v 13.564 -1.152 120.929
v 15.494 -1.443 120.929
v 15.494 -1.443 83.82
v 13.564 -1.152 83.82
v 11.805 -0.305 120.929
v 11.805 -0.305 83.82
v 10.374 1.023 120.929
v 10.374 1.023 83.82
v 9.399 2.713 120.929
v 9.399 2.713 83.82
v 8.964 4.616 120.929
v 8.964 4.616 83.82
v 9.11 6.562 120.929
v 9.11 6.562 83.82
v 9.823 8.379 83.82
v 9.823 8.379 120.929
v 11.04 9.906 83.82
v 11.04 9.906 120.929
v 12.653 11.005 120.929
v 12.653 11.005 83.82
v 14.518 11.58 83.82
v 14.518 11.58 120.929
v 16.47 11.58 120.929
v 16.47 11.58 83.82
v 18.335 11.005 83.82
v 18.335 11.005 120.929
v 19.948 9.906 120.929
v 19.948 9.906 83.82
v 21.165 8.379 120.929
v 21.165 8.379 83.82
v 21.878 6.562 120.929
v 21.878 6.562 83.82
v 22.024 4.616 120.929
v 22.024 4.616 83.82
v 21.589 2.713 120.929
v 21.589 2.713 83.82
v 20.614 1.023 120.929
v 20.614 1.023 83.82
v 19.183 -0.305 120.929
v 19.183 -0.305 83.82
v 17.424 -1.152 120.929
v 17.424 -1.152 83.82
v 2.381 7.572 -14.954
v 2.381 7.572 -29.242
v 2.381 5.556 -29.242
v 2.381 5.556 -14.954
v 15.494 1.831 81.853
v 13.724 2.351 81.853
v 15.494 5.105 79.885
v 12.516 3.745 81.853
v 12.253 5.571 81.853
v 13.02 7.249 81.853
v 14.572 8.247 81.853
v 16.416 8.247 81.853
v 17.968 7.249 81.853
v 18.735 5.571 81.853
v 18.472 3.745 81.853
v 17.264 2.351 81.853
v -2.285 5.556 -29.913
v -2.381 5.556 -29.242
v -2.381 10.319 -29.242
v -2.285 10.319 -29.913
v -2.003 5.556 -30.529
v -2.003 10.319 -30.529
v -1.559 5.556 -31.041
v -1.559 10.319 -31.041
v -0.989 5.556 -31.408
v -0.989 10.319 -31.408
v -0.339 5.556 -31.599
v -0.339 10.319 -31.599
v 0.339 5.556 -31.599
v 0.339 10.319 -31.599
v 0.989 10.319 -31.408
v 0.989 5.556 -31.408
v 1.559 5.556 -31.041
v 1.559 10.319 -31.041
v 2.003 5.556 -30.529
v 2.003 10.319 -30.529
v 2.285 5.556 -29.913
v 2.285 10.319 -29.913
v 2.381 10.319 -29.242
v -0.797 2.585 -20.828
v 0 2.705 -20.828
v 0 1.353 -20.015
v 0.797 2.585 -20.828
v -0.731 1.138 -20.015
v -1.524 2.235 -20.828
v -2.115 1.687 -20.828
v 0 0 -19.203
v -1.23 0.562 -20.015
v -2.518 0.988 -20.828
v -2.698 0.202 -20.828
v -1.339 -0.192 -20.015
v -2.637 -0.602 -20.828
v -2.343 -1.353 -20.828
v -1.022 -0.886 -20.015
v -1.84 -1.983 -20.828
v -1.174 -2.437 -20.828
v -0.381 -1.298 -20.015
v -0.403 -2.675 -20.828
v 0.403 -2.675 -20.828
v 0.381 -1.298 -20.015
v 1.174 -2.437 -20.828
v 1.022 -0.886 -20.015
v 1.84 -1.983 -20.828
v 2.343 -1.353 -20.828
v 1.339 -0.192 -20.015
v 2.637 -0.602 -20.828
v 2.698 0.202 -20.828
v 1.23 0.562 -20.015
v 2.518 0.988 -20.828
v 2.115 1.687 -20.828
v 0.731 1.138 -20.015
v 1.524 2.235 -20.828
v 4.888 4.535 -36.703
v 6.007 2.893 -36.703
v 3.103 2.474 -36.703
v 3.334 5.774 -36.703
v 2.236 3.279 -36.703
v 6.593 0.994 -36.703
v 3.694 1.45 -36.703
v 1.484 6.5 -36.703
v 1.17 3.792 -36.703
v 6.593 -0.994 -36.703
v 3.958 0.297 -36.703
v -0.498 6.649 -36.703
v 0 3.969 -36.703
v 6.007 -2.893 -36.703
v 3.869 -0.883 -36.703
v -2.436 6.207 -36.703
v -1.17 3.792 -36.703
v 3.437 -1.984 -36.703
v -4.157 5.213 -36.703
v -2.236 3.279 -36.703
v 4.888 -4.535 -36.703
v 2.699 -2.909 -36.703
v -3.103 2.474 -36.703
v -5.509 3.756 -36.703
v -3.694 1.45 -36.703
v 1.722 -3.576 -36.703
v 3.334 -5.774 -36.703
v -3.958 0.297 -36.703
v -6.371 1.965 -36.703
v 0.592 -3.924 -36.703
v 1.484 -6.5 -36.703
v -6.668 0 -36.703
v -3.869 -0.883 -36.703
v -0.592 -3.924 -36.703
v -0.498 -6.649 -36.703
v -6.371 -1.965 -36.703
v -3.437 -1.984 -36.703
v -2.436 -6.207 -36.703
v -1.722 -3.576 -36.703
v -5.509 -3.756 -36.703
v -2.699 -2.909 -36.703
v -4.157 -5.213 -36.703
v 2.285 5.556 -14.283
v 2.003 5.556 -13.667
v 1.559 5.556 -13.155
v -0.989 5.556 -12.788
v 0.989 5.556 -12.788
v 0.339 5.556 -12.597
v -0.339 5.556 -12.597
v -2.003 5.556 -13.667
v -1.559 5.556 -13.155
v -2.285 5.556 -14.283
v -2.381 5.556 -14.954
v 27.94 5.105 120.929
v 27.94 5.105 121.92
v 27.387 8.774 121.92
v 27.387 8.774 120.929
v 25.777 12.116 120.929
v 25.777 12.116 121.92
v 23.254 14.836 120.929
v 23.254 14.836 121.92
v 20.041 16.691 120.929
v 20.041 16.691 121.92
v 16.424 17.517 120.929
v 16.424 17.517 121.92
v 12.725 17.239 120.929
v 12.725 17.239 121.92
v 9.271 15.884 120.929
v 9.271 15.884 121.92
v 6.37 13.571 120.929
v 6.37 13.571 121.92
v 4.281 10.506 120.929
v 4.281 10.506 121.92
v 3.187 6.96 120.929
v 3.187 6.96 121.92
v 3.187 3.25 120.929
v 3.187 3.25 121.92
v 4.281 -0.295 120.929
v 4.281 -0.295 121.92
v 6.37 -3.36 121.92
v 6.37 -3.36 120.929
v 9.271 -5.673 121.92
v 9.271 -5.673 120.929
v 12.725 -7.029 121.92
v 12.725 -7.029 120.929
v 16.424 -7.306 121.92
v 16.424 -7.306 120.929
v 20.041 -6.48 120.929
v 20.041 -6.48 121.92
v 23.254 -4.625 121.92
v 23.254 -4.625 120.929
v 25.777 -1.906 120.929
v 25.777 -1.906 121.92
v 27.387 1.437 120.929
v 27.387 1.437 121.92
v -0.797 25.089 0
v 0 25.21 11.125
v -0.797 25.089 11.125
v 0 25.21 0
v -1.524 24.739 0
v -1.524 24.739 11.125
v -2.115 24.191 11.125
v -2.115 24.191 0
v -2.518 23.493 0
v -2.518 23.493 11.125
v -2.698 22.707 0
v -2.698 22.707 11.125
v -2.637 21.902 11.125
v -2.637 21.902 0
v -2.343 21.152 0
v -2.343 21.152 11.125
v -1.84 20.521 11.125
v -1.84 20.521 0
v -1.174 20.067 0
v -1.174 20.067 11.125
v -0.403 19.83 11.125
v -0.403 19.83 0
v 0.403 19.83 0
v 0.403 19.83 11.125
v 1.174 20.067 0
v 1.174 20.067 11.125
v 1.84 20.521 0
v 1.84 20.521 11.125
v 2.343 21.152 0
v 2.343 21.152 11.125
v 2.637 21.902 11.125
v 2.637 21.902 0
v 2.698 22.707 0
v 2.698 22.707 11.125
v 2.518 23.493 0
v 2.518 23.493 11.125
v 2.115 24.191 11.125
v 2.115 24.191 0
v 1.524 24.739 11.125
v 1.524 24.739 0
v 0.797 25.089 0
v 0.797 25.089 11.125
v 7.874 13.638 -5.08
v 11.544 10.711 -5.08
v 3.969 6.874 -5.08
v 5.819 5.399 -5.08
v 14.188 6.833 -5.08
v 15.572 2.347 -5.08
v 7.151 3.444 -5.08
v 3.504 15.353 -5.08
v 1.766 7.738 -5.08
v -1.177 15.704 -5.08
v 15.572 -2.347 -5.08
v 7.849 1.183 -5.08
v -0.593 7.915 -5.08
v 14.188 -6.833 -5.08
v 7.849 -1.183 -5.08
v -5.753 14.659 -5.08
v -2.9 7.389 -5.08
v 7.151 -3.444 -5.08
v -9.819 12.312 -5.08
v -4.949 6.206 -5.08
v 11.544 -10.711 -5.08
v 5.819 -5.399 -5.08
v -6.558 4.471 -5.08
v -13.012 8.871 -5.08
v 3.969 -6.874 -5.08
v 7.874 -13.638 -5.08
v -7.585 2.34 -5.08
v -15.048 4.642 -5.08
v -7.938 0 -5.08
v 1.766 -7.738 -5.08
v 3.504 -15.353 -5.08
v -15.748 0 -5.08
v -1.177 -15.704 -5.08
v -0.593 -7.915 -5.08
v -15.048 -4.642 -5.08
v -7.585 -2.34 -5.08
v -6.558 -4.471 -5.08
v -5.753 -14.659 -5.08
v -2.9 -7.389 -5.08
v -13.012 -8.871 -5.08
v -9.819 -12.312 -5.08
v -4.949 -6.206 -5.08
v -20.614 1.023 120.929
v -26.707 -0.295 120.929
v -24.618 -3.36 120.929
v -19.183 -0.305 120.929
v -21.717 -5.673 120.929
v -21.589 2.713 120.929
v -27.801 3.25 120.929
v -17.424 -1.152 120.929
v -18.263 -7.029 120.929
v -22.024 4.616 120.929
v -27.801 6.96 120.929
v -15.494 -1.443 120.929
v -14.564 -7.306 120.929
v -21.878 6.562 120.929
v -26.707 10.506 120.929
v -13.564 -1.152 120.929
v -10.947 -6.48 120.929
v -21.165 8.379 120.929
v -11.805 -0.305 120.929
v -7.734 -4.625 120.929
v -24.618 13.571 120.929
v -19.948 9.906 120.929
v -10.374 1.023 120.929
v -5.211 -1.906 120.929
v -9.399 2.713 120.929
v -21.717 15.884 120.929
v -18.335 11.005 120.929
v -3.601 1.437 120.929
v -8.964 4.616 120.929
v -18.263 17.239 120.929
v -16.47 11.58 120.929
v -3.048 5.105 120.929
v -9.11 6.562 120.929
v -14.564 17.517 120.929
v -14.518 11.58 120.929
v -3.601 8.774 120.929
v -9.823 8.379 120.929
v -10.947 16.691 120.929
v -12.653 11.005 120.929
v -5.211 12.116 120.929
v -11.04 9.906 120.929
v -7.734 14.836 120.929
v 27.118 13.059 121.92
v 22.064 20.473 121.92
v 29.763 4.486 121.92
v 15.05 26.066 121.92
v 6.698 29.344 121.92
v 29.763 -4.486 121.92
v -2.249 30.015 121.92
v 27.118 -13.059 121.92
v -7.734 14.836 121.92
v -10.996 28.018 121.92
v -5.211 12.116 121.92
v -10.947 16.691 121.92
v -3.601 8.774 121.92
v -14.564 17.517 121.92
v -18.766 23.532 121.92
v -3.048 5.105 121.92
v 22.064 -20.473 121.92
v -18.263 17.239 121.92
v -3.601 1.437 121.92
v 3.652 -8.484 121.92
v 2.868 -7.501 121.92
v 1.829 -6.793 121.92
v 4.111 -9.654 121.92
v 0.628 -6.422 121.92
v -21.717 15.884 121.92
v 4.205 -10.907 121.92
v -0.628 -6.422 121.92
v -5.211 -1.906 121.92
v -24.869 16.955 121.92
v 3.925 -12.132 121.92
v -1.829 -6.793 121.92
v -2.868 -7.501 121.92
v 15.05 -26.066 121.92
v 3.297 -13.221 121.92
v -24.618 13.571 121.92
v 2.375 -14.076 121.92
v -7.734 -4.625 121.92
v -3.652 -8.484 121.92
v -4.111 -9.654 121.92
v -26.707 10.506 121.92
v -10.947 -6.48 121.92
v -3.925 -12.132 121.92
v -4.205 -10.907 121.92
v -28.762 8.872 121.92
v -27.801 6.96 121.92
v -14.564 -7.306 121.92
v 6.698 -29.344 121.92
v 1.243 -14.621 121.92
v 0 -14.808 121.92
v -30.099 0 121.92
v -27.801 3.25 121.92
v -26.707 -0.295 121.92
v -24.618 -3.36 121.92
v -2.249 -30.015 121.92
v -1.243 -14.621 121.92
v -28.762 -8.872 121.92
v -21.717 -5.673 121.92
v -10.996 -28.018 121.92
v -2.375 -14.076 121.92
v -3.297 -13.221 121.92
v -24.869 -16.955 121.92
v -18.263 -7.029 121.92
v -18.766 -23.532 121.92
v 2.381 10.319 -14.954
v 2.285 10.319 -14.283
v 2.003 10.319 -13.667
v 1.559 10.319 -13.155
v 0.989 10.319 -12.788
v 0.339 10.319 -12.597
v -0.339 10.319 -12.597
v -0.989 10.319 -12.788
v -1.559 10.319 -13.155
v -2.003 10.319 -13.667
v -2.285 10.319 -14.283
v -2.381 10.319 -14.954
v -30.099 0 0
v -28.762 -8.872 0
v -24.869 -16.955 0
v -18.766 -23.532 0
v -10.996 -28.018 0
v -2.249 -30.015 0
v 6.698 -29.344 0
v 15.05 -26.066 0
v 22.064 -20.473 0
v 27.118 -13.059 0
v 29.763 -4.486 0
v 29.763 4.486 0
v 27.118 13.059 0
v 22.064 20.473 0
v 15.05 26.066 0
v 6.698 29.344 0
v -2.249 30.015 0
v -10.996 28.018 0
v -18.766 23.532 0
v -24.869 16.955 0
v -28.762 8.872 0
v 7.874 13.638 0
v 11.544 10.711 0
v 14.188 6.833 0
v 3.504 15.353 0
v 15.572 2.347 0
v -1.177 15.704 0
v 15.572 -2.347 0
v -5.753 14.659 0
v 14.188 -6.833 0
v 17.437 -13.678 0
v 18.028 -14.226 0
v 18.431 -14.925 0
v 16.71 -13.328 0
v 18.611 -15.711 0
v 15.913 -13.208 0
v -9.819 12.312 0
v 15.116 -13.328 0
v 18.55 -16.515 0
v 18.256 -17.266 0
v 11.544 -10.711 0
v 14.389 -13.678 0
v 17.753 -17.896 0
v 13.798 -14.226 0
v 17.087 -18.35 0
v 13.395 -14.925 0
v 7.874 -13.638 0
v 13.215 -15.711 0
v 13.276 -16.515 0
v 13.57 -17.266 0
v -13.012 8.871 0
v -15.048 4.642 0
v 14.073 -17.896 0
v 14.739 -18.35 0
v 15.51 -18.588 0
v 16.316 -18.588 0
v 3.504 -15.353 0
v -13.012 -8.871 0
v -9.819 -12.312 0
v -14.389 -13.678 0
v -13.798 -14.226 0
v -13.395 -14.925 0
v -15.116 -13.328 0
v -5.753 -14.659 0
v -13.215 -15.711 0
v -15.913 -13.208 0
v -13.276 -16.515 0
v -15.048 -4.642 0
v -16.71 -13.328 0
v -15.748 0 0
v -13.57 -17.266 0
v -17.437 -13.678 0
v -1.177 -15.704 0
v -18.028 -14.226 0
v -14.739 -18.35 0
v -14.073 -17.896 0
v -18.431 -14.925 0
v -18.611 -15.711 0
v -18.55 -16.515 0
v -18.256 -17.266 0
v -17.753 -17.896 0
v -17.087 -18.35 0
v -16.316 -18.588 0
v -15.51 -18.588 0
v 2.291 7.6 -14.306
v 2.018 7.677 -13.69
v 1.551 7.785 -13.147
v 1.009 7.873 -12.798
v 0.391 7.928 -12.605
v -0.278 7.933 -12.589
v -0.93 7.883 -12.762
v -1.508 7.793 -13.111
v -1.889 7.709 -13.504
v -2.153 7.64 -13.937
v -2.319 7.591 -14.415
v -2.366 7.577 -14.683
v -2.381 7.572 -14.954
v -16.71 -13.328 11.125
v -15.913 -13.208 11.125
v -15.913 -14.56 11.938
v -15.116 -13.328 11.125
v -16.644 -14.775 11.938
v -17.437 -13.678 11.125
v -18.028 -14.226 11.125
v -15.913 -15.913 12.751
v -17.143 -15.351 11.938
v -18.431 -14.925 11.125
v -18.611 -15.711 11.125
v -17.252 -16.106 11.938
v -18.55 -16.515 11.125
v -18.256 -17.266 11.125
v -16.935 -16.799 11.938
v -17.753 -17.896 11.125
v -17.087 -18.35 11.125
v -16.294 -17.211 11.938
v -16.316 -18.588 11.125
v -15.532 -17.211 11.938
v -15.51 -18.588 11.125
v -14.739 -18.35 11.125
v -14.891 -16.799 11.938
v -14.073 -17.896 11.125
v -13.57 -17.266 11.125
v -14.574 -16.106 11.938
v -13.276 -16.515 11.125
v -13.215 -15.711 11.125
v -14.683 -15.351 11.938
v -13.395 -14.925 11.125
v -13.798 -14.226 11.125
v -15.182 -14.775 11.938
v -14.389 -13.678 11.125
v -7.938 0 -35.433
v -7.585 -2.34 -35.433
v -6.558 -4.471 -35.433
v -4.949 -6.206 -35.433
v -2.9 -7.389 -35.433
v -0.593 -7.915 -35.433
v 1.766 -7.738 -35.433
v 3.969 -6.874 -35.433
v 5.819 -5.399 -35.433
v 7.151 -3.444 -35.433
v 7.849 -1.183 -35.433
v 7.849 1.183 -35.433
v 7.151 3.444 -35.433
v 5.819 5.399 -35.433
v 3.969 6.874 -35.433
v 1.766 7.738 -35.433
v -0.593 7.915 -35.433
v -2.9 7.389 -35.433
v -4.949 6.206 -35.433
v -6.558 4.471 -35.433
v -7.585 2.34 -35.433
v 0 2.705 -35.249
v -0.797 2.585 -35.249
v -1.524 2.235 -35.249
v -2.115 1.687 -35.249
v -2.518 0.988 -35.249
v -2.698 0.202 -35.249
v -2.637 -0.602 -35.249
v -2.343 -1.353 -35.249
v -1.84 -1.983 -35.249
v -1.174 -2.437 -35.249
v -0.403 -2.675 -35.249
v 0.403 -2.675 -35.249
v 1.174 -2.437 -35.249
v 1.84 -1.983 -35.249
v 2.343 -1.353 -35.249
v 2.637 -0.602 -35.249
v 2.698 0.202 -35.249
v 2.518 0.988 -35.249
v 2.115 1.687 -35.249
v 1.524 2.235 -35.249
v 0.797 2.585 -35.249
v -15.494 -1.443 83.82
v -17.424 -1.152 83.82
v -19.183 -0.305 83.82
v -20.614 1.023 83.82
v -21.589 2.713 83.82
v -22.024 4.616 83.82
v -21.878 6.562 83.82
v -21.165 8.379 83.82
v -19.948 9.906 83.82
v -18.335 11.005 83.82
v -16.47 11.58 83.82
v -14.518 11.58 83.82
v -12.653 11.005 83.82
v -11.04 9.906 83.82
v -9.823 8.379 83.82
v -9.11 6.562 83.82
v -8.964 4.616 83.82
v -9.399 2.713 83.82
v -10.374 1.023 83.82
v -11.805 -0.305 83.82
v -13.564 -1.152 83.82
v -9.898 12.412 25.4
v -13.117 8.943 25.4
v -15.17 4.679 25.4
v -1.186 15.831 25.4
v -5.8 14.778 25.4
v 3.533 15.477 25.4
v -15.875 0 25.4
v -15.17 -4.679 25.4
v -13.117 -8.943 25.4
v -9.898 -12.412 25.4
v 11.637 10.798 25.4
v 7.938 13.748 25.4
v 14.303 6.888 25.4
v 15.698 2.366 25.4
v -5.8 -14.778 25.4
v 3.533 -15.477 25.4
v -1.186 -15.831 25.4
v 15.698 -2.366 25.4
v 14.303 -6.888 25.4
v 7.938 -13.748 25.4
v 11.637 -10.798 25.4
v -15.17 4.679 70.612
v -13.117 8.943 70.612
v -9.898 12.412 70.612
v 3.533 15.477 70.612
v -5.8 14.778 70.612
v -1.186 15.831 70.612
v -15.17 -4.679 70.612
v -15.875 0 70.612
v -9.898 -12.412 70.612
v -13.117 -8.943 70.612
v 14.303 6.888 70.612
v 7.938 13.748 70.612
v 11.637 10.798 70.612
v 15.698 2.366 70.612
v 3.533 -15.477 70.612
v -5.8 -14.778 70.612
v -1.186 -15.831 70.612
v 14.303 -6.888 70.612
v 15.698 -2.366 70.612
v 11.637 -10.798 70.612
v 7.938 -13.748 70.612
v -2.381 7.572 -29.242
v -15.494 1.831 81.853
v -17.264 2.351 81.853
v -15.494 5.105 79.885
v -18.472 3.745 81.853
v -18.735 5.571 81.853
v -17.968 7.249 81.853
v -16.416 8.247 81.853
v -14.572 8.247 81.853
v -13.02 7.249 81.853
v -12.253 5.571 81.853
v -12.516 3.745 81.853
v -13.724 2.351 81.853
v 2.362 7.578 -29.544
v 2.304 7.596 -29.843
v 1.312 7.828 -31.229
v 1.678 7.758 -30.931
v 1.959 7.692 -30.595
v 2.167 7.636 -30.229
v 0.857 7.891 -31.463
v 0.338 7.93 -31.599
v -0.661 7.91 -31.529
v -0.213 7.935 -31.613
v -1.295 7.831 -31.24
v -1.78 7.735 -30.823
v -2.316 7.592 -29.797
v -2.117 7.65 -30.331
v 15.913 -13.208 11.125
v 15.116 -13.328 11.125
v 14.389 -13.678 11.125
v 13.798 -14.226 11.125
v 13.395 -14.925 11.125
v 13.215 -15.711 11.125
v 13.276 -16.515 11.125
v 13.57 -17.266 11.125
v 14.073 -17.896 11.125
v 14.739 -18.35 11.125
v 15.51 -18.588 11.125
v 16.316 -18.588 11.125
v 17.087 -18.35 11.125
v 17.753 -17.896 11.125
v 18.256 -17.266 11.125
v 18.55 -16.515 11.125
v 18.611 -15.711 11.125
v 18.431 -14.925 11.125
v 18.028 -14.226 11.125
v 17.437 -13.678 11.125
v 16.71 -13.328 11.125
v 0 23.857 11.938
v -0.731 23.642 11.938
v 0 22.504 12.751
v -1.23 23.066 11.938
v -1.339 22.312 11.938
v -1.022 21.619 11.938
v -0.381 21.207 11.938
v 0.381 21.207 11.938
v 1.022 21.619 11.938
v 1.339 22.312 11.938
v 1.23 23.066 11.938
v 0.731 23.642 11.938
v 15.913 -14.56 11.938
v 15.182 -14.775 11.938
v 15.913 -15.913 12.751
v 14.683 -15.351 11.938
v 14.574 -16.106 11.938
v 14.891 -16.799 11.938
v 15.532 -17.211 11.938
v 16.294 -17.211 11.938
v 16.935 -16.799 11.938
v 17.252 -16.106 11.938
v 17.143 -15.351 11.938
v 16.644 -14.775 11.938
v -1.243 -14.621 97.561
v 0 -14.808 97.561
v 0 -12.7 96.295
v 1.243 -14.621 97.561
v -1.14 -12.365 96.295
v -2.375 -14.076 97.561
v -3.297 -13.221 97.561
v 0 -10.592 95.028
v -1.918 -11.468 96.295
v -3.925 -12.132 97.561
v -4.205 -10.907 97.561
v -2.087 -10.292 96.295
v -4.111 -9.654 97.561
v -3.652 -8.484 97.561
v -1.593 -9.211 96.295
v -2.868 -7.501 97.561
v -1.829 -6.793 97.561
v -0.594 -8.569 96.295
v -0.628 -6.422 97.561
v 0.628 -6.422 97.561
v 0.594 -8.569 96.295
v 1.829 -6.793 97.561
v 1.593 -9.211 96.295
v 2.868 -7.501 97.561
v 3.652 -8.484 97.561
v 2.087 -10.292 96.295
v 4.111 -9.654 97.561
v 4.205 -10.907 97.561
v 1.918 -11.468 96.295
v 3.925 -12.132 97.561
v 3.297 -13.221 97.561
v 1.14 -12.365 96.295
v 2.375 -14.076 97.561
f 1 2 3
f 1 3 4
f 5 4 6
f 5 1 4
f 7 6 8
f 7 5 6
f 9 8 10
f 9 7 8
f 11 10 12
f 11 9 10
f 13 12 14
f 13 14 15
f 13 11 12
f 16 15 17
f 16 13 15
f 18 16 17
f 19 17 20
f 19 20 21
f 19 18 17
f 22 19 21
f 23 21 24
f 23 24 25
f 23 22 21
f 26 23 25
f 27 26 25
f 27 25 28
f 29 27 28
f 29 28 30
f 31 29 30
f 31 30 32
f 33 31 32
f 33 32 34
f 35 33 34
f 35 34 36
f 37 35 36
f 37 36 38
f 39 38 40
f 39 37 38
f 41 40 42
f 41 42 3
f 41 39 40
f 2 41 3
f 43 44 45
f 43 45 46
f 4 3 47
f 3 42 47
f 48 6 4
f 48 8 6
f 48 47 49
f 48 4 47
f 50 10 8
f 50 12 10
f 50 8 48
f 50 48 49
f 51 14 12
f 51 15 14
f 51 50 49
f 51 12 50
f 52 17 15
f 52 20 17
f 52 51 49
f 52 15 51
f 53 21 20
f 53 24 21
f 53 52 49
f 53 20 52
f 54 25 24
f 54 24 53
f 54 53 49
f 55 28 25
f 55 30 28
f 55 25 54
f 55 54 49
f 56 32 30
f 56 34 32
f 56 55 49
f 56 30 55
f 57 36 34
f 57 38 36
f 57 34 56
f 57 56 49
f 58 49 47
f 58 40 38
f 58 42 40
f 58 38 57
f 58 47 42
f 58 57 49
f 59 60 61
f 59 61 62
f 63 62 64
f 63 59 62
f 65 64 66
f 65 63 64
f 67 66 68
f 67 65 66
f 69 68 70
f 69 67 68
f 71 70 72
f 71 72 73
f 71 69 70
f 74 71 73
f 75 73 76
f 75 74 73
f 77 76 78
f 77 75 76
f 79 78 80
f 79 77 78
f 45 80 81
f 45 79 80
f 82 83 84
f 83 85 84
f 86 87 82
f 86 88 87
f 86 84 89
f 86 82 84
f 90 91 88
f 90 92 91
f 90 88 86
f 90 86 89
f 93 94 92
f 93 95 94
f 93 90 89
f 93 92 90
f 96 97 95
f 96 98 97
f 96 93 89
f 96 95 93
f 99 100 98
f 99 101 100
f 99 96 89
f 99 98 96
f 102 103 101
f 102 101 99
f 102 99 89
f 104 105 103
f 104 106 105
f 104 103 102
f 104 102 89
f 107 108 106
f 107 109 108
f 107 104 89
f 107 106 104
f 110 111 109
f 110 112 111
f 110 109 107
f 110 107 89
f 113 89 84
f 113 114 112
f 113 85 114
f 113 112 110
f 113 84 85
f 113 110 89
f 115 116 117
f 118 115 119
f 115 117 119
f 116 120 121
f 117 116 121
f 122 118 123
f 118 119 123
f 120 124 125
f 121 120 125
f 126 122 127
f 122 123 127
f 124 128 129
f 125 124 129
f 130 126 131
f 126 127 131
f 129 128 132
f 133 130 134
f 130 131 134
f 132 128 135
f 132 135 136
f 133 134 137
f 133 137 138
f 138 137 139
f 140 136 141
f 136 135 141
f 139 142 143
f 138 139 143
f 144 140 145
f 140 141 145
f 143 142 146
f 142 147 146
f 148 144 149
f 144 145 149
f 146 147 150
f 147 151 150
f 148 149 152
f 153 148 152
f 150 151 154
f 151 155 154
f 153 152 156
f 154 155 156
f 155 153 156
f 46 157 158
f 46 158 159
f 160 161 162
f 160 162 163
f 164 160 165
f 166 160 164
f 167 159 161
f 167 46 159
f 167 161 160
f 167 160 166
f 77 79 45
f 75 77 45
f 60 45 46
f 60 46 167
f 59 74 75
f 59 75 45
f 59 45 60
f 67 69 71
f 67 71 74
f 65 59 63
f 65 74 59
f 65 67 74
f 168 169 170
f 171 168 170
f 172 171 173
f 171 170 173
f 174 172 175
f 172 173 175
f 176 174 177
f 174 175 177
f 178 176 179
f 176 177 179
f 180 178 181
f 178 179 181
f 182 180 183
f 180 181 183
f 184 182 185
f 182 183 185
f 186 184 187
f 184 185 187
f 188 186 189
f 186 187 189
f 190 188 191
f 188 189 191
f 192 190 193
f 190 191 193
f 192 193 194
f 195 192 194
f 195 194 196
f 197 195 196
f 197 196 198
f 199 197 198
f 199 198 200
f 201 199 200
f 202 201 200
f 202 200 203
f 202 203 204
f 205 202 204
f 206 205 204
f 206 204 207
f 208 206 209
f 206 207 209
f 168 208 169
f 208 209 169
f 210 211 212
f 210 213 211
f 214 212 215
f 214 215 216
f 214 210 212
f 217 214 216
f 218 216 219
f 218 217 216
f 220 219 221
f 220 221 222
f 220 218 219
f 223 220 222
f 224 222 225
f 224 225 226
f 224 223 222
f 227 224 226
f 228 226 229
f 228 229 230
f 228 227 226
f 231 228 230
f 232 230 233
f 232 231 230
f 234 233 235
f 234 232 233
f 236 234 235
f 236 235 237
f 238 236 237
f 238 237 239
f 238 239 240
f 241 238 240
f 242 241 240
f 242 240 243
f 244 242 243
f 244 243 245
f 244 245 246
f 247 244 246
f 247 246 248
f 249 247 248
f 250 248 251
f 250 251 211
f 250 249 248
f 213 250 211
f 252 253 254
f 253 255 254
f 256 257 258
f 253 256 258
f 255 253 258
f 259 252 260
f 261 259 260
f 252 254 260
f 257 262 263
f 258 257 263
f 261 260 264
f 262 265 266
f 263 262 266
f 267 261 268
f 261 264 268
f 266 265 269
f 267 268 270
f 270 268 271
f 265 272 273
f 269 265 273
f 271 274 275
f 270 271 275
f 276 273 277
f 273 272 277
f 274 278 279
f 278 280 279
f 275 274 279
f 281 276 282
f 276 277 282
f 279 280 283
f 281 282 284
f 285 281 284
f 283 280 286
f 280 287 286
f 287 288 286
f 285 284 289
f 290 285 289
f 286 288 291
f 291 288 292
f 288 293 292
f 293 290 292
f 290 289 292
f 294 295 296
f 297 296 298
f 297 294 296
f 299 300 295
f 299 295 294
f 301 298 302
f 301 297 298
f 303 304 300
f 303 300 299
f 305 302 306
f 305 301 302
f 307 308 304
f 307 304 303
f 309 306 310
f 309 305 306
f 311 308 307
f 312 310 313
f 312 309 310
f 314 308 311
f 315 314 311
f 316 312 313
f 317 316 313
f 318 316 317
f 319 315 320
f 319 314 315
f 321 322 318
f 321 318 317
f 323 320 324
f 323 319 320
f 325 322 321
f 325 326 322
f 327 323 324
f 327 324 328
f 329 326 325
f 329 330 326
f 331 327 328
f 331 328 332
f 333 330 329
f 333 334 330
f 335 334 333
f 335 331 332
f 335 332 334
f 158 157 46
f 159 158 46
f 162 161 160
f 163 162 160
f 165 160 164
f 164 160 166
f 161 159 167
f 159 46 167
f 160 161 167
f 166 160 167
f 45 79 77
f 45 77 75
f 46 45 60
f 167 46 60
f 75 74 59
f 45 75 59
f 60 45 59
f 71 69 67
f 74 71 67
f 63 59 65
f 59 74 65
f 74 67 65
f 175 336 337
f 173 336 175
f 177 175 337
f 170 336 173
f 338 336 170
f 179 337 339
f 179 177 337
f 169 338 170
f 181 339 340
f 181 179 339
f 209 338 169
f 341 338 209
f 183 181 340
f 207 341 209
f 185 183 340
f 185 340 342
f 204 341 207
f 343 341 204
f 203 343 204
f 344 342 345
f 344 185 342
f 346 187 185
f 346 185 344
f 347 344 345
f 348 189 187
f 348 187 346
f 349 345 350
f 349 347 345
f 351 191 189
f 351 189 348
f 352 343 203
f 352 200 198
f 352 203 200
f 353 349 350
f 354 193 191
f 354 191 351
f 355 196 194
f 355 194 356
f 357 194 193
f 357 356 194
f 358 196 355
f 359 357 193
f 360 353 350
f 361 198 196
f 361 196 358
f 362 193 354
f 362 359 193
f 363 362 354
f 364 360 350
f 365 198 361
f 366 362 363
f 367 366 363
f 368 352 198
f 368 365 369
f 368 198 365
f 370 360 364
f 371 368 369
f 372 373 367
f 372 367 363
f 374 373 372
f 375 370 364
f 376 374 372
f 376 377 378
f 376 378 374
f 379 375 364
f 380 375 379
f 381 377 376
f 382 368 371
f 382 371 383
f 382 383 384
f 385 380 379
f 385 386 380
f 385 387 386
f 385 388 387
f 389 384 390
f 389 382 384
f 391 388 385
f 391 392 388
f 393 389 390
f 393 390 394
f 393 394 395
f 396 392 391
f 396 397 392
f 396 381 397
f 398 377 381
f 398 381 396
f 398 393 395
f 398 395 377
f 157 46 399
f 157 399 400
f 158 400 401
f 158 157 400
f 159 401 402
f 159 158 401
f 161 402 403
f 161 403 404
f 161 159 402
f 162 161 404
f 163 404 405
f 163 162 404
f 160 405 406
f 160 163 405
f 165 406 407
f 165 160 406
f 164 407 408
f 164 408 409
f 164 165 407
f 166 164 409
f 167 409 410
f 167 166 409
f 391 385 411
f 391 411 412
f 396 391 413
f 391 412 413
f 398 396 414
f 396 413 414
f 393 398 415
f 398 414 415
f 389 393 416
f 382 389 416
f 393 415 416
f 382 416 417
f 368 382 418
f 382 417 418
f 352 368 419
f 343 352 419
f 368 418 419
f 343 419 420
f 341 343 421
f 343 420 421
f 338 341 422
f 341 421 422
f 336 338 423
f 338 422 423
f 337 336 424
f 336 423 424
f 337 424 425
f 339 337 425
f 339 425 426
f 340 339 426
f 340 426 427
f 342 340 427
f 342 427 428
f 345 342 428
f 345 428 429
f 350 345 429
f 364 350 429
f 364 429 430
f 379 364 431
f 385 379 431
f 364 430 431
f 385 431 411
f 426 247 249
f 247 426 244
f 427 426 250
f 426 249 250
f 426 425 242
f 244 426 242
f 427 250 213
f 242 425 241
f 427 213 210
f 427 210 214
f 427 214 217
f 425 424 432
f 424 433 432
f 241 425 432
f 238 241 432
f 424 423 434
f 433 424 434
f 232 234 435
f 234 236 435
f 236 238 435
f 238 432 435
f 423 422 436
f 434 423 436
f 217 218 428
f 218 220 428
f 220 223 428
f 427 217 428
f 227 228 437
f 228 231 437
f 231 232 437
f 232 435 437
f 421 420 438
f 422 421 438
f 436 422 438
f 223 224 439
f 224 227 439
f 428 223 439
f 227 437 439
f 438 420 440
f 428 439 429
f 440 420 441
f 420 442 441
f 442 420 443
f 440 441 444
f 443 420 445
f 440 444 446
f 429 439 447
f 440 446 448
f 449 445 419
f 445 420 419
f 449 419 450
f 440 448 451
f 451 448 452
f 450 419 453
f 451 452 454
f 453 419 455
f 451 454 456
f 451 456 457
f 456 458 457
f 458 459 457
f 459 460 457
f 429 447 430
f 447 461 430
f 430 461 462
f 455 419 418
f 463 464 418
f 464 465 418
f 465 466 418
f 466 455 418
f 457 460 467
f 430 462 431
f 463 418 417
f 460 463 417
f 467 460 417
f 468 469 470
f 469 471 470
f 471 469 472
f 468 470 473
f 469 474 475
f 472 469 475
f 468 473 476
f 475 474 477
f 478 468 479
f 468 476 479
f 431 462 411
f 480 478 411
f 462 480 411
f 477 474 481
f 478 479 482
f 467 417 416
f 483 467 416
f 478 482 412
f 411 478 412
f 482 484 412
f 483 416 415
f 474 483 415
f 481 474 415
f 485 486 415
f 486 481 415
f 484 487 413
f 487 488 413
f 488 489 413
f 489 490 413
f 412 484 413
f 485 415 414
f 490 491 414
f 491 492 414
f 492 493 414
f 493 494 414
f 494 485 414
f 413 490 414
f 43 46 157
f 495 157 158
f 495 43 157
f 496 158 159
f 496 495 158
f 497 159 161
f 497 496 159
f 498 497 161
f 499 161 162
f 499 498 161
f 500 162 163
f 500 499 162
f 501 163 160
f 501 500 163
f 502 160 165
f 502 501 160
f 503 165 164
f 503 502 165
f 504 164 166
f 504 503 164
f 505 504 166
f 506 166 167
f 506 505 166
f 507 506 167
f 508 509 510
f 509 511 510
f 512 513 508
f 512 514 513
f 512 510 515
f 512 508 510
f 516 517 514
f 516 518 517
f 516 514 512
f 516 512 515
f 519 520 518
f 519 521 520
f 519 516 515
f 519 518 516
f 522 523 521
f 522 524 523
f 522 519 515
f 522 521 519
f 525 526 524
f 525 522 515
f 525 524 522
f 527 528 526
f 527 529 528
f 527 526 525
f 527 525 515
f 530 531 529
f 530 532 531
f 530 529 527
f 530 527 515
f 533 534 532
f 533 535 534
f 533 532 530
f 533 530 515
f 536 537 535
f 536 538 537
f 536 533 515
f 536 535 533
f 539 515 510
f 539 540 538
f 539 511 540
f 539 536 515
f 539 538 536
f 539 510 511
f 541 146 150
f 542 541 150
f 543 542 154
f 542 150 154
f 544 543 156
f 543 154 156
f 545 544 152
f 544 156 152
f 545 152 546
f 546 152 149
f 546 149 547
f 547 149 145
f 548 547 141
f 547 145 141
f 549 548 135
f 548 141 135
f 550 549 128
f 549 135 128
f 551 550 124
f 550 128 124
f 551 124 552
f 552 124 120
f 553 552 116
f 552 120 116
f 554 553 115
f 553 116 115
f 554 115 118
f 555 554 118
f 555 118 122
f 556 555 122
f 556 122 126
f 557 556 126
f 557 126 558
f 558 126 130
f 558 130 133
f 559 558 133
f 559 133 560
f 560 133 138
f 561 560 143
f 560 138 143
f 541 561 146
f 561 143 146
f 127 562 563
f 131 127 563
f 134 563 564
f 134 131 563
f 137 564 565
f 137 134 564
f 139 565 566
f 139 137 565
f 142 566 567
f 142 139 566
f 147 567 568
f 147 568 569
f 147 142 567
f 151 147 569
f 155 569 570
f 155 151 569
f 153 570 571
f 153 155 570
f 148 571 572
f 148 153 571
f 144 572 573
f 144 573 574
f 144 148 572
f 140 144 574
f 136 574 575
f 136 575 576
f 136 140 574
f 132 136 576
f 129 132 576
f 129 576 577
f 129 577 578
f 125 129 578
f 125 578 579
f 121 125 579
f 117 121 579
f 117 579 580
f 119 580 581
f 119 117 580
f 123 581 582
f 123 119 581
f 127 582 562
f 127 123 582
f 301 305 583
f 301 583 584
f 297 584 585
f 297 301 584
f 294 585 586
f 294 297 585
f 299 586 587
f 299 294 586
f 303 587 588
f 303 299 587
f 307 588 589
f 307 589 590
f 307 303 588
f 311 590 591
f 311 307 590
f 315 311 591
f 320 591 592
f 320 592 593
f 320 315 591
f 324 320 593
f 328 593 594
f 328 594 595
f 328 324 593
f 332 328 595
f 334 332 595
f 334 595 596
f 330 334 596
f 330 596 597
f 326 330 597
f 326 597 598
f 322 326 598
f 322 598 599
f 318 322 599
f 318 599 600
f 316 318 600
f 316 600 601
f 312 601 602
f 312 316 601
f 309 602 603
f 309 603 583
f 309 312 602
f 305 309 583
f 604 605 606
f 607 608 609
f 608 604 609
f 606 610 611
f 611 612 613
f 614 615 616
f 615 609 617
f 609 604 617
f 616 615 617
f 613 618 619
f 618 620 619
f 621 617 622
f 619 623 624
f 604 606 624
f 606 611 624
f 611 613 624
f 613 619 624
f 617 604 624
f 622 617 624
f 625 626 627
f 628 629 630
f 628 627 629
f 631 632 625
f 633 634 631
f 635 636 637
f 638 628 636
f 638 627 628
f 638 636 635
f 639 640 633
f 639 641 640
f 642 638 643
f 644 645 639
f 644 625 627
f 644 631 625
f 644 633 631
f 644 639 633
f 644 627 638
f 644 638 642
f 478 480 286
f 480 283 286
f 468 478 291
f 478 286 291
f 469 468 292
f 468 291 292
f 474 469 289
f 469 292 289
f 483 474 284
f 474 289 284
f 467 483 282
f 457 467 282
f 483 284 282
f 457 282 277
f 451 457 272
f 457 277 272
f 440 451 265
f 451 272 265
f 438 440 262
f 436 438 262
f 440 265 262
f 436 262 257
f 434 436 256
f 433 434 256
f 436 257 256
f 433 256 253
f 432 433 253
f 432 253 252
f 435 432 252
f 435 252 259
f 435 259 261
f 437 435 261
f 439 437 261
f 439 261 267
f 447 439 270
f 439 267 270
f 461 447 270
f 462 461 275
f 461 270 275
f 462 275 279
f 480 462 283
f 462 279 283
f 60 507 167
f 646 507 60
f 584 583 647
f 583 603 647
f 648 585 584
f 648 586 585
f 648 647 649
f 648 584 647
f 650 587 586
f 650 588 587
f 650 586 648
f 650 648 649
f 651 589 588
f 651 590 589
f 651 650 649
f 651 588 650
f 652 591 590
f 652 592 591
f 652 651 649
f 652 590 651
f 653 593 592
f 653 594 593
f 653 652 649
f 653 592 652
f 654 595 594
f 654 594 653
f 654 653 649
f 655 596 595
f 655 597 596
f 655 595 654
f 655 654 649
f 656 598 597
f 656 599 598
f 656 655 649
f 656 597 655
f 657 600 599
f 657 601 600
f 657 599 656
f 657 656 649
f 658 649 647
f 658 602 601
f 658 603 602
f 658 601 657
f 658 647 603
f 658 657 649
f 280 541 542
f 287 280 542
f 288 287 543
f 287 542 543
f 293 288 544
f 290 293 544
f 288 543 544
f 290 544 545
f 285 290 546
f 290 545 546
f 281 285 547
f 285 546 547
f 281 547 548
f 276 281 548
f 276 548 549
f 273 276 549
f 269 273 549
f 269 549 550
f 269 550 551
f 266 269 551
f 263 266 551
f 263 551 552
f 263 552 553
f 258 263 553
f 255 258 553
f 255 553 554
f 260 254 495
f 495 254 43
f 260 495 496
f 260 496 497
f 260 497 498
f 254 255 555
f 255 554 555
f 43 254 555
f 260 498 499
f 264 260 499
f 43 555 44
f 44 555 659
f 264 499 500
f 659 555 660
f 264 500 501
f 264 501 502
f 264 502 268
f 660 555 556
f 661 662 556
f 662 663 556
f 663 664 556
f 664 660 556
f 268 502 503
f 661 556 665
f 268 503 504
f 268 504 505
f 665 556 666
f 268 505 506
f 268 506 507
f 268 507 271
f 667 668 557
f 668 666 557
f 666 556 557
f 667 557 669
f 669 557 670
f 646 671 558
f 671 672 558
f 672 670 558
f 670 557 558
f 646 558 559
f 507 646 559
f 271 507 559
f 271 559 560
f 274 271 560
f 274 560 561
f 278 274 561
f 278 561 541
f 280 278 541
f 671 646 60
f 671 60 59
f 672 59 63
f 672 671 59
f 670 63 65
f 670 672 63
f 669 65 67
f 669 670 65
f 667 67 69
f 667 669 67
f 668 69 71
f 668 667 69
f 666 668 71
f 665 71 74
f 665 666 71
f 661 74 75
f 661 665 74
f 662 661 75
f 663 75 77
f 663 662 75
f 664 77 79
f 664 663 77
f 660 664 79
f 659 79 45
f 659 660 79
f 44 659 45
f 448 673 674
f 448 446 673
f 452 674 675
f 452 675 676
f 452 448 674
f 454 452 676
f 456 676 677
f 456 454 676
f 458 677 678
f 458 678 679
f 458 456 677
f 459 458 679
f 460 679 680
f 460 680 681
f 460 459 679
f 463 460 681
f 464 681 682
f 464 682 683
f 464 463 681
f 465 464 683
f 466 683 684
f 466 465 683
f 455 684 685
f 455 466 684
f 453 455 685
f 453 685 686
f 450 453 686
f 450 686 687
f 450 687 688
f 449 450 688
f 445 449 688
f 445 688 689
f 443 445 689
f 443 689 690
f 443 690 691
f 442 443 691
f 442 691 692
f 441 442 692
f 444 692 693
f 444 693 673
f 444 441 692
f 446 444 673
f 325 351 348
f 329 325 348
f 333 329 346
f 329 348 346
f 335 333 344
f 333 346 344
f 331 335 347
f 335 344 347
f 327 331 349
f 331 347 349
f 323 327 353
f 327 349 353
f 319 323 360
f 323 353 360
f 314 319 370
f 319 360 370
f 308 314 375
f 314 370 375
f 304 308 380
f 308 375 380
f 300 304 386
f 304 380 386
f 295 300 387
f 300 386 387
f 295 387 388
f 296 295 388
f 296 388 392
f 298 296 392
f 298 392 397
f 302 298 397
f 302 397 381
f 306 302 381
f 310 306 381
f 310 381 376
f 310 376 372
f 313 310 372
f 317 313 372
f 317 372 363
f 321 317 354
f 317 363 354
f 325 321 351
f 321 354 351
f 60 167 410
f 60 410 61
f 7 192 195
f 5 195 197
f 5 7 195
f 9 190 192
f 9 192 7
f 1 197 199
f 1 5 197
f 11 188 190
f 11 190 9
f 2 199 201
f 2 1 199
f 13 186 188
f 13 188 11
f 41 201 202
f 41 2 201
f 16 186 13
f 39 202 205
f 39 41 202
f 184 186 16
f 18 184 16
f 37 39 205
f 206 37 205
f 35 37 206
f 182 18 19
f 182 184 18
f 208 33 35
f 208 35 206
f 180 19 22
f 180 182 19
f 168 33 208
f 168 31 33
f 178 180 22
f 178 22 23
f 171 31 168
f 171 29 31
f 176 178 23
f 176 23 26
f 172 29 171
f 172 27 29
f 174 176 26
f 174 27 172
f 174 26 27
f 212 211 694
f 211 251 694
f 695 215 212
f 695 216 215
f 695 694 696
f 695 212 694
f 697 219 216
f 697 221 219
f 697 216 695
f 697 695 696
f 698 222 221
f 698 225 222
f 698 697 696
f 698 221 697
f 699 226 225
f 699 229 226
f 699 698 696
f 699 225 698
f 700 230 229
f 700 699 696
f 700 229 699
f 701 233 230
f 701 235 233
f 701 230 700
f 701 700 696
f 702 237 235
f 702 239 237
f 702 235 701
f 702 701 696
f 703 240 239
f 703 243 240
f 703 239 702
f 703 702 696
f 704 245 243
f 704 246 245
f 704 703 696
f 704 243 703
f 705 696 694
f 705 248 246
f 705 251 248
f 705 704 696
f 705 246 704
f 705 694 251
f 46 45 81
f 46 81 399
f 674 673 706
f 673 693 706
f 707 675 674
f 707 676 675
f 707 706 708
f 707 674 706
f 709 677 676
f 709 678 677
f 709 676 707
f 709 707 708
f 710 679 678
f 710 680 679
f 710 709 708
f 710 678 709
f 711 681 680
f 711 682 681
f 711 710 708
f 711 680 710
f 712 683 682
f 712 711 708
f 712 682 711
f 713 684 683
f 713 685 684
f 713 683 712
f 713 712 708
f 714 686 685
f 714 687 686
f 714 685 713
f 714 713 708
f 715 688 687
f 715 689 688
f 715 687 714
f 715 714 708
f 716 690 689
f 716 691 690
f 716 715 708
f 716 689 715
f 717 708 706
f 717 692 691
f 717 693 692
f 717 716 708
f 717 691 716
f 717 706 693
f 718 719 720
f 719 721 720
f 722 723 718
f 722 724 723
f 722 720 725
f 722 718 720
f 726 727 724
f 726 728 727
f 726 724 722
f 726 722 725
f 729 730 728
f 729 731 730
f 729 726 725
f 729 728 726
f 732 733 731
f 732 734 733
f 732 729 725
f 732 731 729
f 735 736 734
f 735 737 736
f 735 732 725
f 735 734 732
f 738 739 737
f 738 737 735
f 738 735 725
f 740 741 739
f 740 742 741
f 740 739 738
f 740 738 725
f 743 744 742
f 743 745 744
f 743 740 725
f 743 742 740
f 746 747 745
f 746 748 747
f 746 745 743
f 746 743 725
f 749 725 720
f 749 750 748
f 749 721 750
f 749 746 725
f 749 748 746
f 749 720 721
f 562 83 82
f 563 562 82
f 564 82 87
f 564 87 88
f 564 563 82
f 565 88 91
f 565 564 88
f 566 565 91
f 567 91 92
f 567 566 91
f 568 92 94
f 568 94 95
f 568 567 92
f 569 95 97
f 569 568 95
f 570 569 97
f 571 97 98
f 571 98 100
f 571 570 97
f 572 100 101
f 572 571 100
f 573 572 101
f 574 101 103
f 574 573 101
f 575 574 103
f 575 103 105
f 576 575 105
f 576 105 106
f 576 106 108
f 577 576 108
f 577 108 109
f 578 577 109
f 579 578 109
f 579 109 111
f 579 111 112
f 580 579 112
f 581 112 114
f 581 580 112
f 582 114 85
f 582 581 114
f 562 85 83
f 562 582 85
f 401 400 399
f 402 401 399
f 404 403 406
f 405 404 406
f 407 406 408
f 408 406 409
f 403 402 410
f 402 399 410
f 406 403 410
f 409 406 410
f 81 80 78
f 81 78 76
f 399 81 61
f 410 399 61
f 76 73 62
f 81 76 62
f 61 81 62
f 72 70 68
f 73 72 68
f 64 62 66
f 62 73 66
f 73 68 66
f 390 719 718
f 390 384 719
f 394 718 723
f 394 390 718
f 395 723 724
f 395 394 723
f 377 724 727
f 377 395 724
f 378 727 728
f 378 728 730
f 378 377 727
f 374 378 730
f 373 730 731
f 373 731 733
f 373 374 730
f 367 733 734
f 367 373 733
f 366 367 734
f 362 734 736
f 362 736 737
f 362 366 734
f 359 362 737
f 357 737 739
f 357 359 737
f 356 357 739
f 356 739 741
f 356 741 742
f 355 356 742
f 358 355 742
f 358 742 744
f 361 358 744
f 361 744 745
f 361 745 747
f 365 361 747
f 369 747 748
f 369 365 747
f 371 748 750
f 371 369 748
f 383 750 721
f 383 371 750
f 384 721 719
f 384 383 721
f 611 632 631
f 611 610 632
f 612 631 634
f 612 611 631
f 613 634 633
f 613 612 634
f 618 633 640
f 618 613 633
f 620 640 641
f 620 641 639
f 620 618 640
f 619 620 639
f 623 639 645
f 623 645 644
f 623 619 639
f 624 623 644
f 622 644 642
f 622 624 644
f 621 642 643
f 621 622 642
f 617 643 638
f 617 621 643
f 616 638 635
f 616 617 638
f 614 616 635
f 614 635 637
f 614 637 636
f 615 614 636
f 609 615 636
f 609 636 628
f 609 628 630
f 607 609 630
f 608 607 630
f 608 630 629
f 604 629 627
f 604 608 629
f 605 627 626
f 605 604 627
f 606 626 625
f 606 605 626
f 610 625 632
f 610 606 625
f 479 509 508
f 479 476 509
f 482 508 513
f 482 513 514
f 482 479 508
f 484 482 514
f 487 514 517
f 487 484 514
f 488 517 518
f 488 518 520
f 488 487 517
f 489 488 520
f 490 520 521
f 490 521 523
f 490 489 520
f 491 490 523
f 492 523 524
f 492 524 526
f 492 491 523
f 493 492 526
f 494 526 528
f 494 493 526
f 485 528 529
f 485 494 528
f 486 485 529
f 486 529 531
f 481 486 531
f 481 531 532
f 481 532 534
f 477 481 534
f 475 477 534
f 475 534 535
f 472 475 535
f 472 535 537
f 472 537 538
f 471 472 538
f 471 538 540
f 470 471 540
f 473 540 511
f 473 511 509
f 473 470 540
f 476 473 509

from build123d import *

# Parameters (mm, degrees)
SKETCH1_R                         = 30.099
BOSS_EXTRUDE1_DEPTH               = 121.92
CHAMFER1_SIZE                     = 1.27
CUT_EXTRUDE1_DEPTH                = 2.38125
BOSS_EXTRUDE2_DEPTH               = 4.7625
F_1_4_28_TAPPED_HOLE1_AT_2_COUNT  = 2
F_1_4_28_TAPPED_HOLE1_AT_2_PITCH  = 41.582709103
F_1_4_28_TAPPED_HOLE1_AT_3_COUNT  = 2
F_1_4_28_TAPPED_HOLE1_AT_3_PITCH  = 41.582709103
F_9_16_18_TAPPED_HOLE1_AT_2_COUNT = 2
F_9_16_18_TAPPED_HOLE1_AT_2_PITCH = 30.988
SKETCH11_R                        = 12.446
CUT_EXTRUDE2_DEPTH                = 0.9906
SKETCH14_W                        = 45.212
SKETCH14_H                        = 15.875


with BuildPart() as part:
    # Sketch1 → Boss-Extrude1 (new body)
    with BuildSketch(Plane.XY):
        Circle(SKETCH1_R)
    extrude(amount=BOSS_EXTRUDE1_DEPTH)

    # Sketch3 → Revolve1 (revolve)
    with BuildSketch(Plane(origin=(0, 0, 0), x_dir=(0, 0, -1), z_dir=(1, 0, 0))):
        Polygon((0, 15.748), (5.08, 15.748), (5.08, 7.9375), (36.703, 7.9375), (36.703, 0), (0, 0), align=None)
    revolve(axis=Axis((0, 0, 0), (0, 0, 1)))

    # Chamfer1
    chamfer1_edges = [part.edges().sort_by_distance(p)[0] for p in [
        (0, -7.9375, -36.703),
    ]]
    chamfer(chamfer1_edges, length=CHAMFER1_SIZE)

    # Sketch4 → Cut-Extrude1 (cut)
    with BuildSketch(Plane(origin=(0, 7.9375, 0), x_dir=(1, 0, 0), z_dir=(0, 1, 0))):
        with BuildLine():
            Line((2.38125, 29.24175), (2.38125, 14.95425))
            ThreePointArc((2.38125, 14.95425), (0, 12.573), (-2.38125, 14.95425))
            Line((-2.38125, 14.95425), (-2.38125, 29.24175))
            ThreePointArc((-2.38125, 29.24175), (0, 31.623), (2.38125, 29.24175))
        make_face()
    extrude(amount=-CUT_EXTRUDE1_DEPTH, mode=Mode.SUBTRACT)

    # Sketch7 → 1/4-28 Tapped Hole1 (revolve, cut)
    with BuildSketch(Plane(origin=(0, 22.5044, 0), x_dir=(0, 1, 0), z_dir=(1, 0, 0))):
        Polygon((0, 0), (0, 12.750588061), (2.7051, 11.1252), (2.7051, 0), align=None)
    f_1_4_28_tapped_hole1 = revolve(axis=Axis((0, 22.5044, -6.35), (0, 0, 1)), mode=Mode.SUBTRACT)

    # 1/4-28 Tapped Hole1 at 2: 1/4-28 Tapped Hole1 ×2
    with Locations(*[Vector(-0.3826834323650891, -0.9238795325112871, 0) * (i * F_1_4_28_TAPPED_HOLE1_AT_2_PITCH) for i in range(1, F_1_4_28_TAPPED_HOLE1_AT_2_COUNT)]):
        add(f_1_4_28_tapped_hole1, mode=Mode.SUBTRACT)

    # 1/4-28 Tapped Hole1 at 3: 1/4-28 Tapped Hole1 ×2
    with Locations(*[Vector(0.3826834323650891, -0.9238795325112871, 0) * (i * F_1_4_28_TAPPED_HOLE1_AT_3_PITCH) for i in range(1, F_1_4_28_TAPPED_HOLE1_AT_3_COUNT)]):
        add(f_1_4_28_tapped_hole1, mode=Mode.SUBTRACT)

    # Sketch9 → 9/16-18 Tapped Hole1 (revolve, cut)
    with BuildSketch(Plane(origin=(15.494, 5.1054, 121.92), x_dir=(0, -1, 0), z_dir=(1, 0, 0))):
        Polygon((0, 0), (0, 42.034507437), (6.54812, 38.1), (6.54812, 0), align=None)
    f_9_16_18_tapped_hole1 = revolve(axis=Axis((15.494, 5.1054, 128.27), (0, 0, -1)), mode=Mode.SUBTRACT)

    # 9/16-18 Tapped Hole1 at 2: 9/16-18 Tapped Hole1 ×2
    with Locations(*[(-i * F_9_16_18_TAPPED_HOLE1_AT_2_PITCH, 0, 0) for i in range(1, F_9_16_18_TAPPED_HOLE1_AT_2_COUNT)]):
        add(f_9_16_18_tapped_hole1, mode=Mode.SUBTRACT)

    # Sketch11 → Cut-Extrude2 (cut)
    with BuildSketch(Plane.XY.offset(121.92)):
        with Locations((-15.494, 5.1054)):
            Circle(SKETCH11_R)
        with Locations((15.494, 5.1054)):
            Circle(SKETCH11_R)
    extrude(amount=-CUT_EXTRUDE2_DEPTH, mode=Mode.SUBTRACT)

    # Sketch12 → 3/8-24 Tapped Hole1 (revolve, cut)
    with BuildSketch(Plane(origin=(0, -10.5918, 121.92), x_dir=(0, -1, 0), z_dir=(1, 0, 0))):
        Polygon((0, 0), (0, 26.892068714), (4.2164, 24.3586), (4.2164, 0), align=None)
    revolve(axis=Axis((0, -10.5918, 128.27), (0, 0, -1)), mode=Mode.SUBTRACT)

    # Sketch14 → Cut-Revolve1 (revolve, cut)
    with BuildSketch(Plane(origin=(0, 0, 0), x_dir=(0, 0, -1), z_dir=(1, 0, 0))):
        with Locations((-48.006, 7.9375)):
            Rectangle(SKETCH14_W, SKETCH14_H)
    revolve(axis=Axis((0, 0, 0), (0, 0, 1)), mode=Mode.SUBTRACT)

    # Sketch18 → 1/4-28 Tapped Hole2 (revolve, cut)
    with BuildSketch(Plane(origin=(0, 0, -36.703), x_dir=(0, 1, 0), z_dir=(1, 0, 0))):
        Polygon((0, 0), (0, 17.500388061), (2.7051, 15.875), (2.7051, 1.453663038), (3.96875, 0), align=None)
    revolve(axis=Axis((0, 0, -43.053), (0, 0, 1)), mode=Mode.SUBTRACT)


with BuildPart() as body_2:
    # Sketch5 → Boss-Extrude2 (new body)
    with BuildSketch(Plane(origin=(0, 5.55625, 0), x_dir=(1, 0, 0), z_dir=(0, 1, 0))):
        with BuildLine():
            Line((2.38125, 29.24175), (2.38125, 14.95425))
            ThreePointArc((2.38125, 14.95425), (0, 12.573), (-2.38125, 14.95425))
            Line((-2.38125, 14.95425), (-2.38125, 29.24175))
            ThreePointArc((-2.38125, 29.24175), (0, 31.623), (2.38125, 29.24175))
        make_face()
    extrude(amount=BOSS_EXTRUDE2_DEPTH)


solid = Compound([part.part, body_2.part])
